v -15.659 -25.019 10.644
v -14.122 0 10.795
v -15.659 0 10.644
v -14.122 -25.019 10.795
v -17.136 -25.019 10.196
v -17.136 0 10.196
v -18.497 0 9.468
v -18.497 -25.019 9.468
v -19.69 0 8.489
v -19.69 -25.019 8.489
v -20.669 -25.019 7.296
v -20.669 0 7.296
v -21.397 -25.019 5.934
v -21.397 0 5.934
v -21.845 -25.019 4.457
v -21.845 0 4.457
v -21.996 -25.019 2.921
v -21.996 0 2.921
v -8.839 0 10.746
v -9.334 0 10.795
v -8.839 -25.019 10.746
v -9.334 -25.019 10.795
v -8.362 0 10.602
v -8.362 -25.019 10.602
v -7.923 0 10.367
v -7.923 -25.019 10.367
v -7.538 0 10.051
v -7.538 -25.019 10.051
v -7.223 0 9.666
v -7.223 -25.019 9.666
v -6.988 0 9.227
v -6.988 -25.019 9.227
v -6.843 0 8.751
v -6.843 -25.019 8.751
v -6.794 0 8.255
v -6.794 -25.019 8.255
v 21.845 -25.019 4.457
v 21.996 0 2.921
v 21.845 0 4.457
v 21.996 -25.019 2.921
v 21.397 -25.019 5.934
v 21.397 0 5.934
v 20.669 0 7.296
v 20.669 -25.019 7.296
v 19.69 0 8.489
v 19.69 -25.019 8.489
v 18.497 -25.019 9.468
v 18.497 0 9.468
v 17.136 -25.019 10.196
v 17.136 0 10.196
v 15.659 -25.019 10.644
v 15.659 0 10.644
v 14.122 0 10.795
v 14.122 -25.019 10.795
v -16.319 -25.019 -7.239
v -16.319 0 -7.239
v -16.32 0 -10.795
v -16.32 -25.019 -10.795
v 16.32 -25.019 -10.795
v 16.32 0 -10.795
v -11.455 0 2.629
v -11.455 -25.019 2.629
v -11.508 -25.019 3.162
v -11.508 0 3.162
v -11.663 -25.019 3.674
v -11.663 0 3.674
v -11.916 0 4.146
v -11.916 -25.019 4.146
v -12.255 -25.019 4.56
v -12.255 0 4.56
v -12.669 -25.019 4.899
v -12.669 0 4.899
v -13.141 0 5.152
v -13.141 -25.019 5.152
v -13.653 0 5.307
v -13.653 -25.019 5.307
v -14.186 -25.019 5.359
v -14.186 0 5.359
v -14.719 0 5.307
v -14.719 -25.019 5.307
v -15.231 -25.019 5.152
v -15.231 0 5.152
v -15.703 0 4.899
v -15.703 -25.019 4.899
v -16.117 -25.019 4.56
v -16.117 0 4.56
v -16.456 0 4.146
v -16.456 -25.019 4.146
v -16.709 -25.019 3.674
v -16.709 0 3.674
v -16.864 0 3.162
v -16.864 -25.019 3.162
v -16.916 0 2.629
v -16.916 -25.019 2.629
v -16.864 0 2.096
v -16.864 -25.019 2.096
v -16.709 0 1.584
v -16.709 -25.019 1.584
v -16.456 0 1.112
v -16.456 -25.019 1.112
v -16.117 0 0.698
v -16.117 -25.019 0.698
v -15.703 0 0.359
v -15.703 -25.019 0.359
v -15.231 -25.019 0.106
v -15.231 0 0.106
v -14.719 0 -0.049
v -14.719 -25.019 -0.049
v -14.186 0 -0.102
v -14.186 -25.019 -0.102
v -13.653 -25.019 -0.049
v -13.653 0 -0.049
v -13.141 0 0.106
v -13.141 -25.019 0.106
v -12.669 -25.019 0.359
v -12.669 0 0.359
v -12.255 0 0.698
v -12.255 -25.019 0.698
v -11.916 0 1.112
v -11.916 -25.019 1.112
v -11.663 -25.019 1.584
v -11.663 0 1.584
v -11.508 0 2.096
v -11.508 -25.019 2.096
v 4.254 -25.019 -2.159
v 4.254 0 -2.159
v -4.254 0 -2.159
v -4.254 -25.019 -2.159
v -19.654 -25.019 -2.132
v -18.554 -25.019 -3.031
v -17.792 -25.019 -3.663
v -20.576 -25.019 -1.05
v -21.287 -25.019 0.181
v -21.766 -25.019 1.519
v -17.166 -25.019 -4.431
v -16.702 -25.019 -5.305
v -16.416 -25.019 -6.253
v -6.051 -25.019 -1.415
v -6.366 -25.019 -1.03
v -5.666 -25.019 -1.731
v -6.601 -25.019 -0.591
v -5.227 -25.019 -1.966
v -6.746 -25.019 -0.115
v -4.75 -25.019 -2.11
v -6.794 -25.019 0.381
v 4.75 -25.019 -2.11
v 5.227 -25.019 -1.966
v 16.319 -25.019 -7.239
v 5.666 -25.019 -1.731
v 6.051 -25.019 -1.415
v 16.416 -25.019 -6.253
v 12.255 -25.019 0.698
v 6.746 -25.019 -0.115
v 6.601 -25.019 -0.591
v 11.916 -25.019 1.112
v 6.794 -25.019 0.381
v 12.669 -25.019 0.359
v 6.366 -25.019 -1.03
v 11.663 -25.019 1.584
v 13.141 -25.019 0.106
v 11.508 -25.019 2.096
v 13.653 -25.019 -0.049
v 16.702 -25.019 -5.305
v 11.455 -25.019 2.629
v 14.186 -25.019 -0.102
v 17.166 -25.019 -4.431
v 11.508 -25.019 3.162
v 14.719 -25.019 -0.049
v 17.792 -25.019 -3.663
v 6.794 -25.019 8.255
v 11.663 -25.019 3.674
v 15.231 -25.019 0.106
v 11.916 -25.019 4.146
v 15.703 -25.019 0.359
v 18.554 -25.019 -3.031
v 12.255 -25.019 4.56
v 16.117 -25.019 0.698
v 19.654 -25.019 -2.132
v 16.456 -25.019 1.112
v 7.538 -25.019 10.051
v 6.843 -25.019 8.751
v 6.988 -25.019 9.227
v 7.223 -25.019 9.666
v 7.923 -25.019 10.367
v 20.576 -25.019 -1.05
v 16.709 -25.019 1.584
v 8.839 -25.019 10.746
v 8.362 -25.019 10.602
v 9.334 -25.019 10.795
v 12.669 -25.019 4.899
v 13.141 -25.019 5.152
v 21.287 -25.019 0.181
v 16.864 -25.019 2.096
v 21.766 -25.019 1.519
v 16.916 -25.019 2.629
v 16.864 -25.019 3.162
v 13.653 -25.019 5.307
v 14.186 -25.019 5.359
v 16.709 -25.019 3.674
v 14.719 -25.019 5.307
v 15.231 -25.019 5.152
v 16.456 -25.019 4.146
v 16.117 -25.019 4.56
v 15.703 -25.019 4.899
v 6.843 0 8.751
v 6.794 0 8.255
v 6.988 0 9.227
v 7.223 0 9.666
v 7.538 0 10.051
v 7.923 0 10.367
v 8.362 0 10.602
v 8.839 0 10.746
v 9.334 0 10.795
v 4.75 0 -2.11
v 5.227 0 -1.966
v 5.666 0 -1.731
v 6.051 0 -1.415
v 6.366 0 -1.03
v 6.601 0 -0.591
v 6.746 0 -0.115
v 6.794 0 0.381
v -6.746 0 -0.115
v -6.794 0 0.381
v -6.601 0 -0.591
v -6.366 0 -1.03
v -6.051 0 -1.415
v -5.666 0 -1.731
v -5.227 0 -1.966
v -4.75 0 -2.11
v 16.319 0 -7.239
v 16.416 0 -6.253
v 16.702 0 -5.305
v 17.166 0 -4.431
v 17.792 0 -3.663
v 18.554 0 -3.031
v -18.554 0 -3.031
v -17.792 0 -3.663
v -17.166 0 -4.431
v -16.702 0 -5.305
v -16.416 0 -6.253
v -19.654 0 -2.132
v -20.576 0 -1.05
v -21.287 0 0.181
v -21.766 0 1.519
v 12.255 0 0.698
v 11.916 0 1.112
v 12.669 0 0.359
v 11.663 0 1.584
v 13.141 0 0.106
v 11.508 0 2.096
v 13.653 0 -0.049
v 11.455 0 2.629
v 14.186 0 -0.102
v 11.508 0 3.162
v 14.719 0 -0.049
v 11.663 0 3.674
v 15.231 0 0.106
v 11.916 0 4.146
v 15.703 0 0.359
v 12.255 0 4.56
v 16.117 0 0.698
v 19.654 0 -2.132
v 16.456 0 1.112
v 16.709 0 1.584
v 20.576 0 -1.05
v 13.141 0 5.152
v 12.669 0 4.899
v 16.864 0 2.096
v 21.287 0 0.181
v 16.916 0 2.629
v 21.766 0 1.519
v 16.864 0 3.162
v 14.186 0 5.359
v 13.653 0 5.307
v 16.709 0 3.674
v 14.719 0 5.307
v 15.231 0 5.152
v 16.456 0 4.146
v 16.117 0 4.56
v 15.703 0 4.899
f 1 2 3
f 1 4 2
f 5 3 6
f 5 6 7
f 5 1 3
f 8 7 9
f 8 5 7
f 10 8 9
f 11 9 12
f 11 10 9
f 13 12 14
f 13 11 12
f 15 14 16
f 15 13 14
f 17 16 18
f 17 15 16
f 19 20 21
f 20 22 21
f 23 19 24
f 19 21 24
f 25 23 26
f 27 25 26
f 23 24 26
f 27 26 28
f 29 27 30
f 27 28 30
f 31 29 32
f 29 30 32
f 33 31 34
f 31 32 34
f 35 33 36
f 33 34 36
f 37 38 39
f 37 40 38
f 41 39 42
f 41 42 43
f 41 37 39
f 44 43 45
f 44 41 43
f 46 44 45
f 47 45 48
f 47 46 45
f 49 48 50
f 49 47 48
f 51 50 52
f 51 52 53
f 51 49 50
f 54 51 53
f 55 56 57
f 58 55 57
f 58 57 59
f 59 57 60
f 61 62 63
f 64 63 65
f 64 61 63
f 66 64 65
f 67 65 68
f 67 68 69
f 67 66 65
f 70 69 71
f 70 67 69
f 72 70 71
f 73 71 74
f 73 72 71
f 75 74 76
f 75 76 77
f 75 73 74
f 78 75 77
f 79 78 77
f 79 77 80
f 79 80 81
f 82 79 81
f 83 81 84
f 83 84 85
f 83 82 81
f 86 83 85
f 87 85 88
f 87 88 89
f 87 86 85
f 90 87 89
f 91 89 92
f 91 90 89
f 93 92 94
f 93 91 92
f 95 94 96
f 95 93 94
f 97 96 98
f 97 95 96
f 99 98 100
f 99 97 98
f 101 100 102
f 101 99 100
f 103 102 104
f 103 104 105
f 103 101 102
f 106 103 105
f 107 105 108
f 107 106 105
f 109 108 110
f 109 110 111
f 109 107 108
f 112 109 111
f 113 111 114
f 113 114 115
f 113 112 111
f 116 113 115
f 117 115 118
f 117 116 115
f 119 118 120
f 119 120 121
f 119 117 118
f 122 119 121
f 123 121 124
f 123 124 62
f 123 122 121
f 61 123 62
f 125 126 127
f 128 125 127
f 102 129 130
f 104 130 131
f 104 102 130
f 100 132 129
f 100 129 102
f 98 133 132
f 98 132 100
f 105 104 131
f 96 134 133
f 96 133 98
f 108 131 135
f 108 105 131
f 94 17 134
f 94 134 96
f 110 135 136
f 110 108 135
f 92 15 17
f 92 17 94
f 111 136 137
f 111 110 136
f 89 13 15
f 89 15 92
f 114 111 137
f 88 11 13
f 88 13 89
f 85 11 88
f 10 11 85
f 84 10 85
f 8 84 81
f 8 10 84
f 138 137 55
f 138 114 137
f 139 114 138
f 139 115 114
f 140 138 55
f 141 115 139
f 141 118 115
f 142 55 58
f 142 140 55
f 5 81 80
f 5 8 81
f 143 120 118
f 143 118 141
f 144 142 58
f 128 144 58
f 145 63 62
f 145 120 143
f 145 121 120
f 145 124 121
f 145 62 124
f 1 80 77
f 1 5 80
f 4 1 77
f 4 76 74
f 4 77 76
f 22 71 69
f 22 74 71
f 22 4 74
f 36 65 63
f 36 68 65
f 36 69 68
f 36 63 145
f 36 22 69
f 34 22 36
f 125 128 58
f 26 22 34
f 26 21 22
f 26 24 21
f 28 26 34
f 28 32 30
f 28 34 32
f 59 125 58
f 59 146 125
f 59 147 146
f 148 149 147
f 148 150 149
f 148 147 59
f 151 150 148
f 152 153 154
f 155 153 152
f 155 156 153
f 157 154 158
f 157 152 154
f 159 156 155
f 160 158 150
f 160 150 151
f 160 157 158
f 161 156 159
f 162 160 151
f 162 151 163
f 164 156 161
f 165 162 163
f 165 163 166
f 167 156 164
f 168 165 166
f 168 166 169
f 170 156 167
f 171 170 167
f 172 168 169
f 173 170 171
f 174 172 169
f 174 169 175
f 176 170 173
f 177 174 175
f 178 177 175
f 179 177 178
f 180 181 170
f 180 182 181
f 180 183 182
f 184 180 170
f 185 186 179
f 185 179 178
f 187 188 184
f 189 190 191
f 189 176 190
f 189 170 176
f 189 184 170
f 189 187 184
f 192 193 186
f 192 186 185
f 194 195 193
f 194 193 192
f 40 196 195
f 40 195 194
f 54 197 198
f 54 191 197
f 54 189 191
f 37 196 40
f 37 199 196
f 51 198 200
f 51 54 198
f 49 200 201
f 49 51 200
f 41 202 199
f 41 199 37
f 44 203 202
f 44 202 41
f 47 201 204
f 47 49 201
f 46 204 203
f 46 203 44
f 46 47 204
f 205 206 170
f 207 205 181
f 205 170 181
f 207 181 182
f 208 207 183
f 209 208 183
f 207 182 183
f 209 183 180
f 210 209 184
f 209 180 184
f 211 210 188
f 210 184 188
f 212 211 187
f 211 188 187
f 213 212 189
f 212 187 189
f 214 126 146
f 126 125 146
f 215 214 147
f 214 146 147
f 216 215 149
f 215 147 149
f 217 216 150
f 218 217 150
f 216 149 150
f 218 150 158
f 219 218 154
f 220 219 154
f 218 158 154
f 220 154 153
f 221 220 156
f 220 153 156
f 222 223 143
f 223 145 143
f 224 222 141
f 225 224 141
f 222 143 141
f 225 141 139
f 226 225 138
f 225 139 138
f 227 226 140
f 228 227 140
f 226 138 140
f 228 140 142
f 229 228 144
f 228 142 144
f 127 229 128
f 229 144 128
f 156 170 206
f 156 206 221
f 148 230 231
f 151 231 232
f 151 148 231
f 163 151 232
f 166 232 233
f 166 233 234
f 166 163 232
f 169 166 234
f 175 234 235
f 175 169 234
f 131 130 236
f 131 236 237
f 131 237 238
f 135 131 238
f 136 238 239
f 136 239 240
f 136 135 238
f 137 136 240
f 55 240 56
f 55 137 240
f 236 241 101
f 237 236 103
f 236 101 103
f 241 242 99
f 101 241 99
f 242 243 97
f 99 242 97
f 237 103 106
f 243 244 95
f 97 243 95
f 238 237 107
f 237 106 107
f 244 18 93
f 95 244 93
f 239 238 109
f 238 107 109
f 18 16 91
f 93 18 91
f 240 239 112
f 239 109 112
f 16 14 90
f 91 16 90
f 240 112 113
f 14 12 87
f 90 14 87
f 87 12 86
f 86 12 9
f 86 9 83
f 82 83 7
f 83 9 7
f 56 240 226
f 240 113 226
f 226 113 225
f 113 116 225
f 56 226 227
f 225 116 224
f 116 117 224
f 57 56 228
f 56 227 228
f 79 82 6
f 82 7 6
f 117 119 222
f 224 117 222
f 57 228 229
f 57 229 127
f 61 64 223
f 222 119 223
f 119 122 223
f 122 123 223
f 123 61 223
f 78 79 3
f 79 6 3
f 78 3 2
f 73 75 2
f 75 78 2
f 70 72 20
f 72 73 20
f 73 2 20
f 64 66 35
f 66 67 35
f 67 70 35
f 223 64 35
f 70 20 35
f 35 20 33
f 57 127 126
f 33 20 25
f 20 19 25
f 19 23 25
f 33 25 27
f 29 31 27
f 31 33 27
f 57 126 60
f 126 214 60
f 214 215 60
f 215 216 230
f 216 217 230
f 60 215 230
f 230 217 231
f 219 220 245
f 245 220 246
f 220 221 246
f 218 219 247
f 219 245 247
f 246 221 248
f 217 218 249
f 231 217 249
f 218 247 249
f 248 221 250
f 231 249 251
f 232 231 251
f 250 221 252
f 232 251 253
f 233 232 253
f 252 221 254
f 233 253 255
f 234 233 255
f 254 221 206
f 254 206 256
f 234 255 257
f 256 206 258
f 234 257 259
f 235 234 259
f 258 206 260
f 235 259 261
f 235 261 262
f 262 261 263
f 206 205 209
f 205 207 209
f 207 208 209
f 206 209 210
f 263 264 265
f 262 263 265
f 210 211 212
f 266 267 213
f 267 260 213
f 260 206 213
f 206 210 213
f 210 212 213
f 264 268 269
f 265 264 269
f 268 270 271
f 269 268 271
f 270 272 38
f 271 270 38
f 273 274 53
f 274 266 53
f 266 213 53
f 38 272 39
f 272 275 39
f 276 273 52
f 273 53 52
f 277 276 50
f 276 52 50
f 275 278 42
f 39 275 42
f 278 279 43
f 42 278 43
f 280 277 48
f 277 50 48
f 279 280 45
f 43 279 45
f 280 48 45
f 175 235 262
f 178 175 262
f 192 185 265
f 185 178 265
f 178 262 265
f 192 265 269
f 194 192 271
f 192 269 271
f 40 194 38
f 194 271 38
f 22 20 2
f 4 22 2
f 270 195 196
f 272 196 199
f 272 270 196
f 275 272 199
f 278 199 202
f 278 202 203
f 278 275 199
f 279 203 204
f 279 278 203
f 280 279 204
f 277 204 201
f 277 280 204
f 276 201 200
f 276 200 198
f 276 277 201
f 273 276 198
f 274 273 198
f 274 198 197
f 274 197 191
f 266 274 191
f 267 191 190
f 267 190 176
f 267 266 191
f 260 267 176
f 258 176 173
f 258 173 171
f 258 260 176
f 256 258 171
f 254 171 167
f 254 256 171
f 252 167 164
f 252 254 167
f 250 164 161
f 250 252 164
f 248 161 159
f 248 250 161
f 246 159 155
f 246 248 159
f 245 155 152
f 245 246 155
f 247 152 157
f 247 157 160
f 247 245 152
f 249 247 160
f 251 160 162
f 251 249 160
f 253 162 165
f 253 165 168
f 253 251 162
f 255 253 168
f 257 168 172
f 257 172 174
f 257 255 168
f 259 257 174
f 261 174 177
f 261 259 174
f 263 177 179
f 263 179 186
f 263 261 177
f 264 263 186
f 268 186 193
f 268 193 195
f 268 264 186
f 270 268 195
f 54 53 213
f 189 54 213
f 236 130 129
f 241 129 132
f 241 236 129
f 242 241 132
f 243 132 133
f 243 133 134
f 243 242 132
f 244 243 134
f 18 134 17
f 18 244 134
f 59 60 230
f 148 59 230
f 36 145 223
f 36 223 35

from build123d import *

# Parameters (mm, degrees)
F0_R        = 2.7305
F1_DEPTH    = 25.019
F2_R        = 2.54
F3_R        = 7.874
F4_R        = 5.08
F5_T1_DEPTH = 50.419


# Not quite as in the source:
# - a fillet or chamfer that OpenCascade refuses, or shapes differently, is made with other operations: its cross-section is extruded or revolved along the edge and cut away or added


with BuildPart() as f1:
    # F0 (on Front) → F1 (new body)
    with BuildSketch(Plane.XZ):
        Polygon((-6.7945, 10.795), (-21.9964, 10.795), (-21.9964, -2.159), (-16.3195, -2.159), (-16.3195, -10.795), (0, -10.795), (16.3195, -10.795), (16.3195, -2.159), (21.9964, -2.159), (21.9964, 10.795), (6.7945, 10.795), (6.7945, -2.159), (0, -2.159), (-6.7945, -2.159), align=None)
        with Locations((-14.1859, 2.6289)):
            Circle(F0_R, mode=Mode.SUBTRACT)
        with Locations((14.1859, 2.6289)):
            Circle(F0_R, mode=Mode.SUBTRACT)
    extrude(amount=F1_DEPTH)

    # F2
    f2_edges = [f1.edges().sort_by_distance(p)[0] for p in [
        (-6.7945, -12.5095, 10.795),
        (-6.7945, -12.5095, -2.159),
        (6.7945, -12.5095, -2.159),
        (6.7945, -12.5095, 10.795),
    ]]
    fillet(f2_edges, radius=F2_R)

    # F3
    f3_edges = [f1.edges().sort_by_distance(p)[0] for p in [
        (-21.9964, -12.5095, 10.795),
        (21.9964, -12.5095, 10.795),
    ]]
    fillet(f3_edges, radius=F3_R)

    # F4
    f4_edges = [f1.edges().sort_by_distance(p)[0] for p in [
        (-16.3195, -12.5095, -2.159),
        (16.3195, -12.5095, -2.159),
    ]]
    fillet(f4_edges, radius=F4_R)

    # F5: fillet of radius 7.874 on 2 edges, made by hand

    # F5_s2 → F5_t1 (cut)
    with BuildSketch(Plane.XZ.offset(-12.7)):
        with BuildLine():
            ThreePointArc((-18.5538606902, -3.0308249896), (-20.9591016403, -0.4505219212), (-21.9964, 2.921))
            Line((-21.9964, 2.921), (-22.781728024, 2.8639153723))
            ThreePointArc((-22.781728024, 2.8639153723), (-22.7838, 0.381), (-22.7838, -2.159))
            Line((-22.7838, -2.159), (-21.9964, -2.9464))
            ThreePointArc((-21.9964, -2.9464), (-21.3995, -2.9464), (-18.9949347832, -3.6830921162))
            Line((-18.9949347832, -3.6830921162), (-18.5538606902, -3.0308249896))
        make_face()
        with BuildLine():
            ThreePointArc((18.5538606902, -3.0308249896), (20.9591016403, -0.4505219212), (21.9964, 2.921))
            Line((21.9964, 2.921), (22.781728024, 2.8639153723))
            ThreePointArc((22.781728024, 2.8639153723), (22.7838, 0.381), (22.7838, -2.159))
            Line((22.7838, -2.159), (21.9964, -2.9464))
            ThreePointArc((21.9964, -2.9464), (21.3995, -2.9464), (18.9949347832, -3.6830921162))
            Line((18.9949347832, -3.6830921162), (18.5538606902, -3.0308249896))
        make_face()
    extrude(amount=F5_T1_DEPTH, mode=Mode.SUBTRACT)


solid = f1.part
